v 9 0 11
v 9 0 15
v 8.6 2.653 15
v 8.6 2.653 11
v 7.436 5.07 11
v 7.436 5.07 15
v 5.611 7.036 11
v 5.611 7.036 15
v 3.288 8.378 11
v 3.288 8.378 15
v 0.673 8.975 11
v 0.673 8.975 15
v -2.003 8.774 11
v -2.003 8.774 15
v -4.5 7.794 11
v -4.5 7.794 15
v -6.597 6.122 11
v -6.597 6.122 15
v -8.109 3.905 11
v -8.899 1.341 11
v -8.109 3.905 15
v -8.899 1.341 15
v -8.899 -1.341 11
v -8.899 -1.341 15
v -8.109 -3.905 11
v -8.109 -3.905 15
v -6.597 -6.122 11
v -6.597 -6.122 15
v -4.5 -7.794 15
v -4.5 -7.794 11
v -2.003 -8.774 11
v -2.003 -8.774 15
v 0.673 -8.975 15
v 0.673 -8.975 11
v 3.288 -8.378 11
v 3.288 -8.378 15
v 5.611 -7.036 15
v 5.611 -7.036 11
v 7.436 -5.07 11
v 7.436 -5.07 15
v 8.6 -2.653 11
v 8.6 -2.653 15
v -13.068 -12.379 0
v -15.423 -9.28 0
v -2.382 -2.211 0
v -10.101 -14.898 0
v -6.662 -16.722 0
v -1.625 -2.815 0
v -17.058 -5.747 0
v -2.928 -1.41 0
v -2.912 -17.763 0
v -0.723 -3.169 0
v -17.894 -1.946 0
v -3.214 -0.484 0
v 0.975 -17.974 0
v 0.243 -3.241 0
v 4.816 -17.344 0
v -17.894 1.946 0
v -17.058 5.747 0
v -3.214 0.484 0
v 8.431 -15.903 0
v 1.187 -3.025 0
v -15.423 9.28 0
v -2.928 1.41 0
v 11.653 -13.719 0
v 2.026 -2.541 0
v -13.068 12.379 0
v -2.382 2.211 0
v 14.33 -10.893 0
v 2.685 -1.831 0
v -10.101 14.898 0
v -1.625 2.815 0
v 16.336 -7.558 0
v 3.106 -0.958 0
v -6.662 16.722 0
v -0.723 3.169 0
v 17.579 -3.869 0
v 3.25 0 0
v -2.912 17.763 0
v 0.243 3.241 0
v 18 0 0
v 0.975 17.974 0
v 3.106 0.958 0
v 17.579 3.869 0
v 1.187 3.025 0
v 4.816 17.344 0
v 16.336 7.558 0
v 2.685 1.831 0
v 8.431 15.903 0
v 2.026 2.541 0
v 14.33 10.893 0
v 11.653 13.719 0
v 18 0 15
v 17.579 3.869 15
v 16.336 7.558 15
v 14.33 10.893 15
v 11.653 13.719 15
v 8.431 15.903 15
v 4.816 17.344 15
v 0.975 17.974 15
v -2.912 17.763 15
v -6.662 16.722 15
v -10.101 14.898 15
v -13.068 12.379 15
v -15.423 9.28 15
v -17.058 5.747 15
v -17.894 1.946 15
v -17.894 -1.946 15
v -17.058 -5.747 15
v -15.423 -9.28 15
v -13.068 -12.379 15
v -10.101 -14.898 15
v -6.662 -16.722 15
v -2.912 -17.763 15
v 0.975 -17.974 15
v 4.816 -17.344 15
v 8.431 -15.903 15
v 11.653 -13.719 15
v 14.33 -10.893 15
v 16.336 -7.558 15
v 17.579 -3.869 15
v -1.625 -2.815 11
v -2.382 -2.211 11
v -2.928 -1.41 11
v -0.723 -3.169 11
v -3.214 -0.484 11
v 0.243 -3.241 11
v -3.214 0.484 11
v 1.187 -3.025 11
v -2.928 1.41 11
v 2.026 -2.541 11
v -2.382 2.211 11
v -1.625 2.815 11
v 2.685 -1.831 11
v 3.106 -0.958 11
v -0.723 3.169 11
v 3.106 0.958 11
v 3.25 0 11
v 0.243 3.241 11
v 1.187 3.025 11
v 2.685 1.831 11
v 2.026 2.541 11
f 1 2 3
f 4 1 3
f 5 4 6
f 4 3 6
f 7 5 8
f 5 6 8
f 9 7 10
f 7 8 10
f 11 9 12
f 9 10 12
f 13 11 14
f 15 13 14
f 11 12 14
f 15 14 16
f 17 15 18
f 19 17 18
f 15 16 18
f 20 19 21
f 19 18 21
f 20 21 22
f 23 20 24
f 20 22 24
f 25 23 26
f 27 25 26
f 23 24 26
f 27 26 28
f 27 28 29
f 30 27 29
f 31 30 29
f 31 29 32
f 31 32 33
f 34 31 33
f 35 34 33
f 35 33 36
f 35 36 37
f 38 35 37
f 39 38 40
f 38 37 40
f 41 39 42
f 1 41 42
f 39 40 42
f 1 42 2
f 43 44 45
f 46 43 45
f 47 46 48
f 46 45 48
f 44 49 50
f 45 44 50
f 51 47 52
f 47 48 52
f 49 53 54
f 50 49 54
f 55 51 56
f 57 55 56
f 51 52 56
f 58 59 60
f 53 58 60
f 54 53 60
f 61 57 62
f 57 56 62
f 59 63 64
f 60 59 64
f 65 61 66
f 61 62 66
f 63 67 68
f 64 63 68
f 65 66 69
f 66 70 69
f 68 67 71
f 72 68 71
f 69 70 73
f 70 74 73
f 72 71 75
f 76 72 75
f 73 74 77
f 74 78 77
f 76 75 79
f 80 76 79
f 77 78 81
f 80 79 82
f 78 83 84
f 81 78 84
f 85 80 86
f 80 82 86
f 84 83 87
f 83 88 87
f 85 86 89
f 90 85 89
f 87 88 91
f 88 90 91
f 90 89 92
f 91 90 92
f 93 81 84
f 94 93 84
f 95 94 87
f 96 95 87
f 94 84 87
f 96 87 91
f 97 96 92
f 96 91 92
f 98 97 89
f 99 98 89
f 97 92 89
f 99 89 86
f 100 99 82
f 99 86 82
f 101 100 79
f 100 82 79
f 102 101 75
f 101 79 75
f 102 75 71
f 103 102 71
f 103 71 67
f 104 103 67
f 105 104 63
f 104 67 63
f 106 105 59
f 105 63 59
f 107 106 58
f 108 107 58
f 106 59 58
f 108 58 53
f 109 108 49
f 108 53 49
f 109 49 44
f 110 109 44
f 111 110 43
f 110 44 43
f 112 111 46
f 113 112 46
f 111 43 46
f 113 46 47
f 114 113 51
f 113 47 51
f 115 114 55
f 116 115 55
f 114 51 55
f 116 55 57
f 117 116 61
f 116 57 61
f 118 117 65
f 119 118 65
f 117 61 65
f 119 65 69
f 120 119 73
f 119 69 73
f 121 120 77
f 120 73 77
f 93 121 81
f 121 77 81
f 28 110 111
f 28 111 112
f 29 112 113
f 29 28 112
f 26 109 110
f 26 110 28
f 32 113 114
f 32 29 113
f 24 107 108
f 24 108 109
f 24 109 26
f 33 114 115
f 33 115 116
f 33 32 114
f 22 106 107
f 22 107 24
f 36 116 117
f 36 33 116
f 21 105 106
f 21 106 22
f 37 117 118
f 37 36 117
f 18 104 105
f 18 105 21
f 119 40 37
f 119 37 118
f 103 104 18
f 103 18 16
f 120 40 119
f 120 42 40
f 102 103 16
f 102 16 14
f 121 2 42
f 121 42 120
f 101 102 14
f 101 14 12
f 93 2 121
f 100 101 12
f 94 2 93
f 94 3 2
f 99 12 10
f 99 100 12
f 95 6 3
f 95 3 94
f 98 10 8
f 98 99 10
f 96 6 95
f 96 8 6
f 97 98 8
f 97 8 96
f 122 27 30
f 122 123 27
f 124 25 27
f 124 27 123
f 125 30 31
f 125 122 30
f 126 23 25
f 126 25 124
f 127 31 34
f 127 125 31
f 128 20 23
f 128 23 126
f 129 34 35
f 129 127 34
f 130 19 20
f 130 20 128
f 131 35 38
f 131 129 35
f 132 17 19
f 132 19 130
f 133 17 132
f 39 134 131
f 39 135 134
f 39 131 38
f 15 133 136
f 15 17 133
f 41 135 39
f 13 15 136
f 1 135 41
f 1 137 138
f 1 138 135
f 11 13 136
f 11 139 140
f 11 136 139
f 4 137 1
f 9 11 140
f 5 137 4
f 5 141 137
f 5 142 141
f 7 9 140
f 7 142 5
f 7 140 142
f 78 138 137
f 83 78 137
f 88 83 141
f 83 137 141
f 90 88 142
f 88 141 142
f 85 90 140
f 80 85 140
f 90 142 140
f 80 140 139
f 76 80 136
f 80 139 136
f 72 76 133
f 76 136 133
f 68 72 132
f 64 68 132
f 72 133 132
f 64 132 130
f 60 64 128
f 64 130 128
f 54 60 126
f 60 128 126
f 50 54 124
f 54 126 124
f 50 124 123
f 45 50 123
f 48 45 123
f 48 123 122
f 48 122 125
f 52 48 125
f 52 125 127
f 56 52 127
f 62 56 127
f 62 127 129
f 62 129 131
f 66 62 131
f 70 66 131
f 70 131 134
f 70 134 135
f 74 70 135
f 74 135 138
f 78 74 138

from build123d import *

# Parameters (mm, degrees)
F0_R     = 18
F1_DEPTH = 15
F2_R     = 9
F2_R_2   = 3.25
F3_DEPTH = 4
F4_DEPTH = 25


with BuildPart() as f1:
    # F0 (on Top) → F1 (new body)
    with BuildSketch(Plane.XY):
        Circle(F0_R)
    extrude(amount=F1_DEPTH)

    # F2 (on face) → F3 (cut)
    with BuildSketch(Plane.XY.offset(15)):
        Circle(F2_R)
        Circle(F2_R_2, mode=Mode.SUBTRACT)
    extrude(amount=-F3_DEPTH, mode=Mode.SUBTRACT)

    # F2 (on face) → F4 (cut)
    with BuildSketch(Plane.XY.offset(15)):
        Circle(F2_R_2)
    extrude(amount=-F4_DEPTH, mode=Mode.SUBTRACT)


solid = f1.part
